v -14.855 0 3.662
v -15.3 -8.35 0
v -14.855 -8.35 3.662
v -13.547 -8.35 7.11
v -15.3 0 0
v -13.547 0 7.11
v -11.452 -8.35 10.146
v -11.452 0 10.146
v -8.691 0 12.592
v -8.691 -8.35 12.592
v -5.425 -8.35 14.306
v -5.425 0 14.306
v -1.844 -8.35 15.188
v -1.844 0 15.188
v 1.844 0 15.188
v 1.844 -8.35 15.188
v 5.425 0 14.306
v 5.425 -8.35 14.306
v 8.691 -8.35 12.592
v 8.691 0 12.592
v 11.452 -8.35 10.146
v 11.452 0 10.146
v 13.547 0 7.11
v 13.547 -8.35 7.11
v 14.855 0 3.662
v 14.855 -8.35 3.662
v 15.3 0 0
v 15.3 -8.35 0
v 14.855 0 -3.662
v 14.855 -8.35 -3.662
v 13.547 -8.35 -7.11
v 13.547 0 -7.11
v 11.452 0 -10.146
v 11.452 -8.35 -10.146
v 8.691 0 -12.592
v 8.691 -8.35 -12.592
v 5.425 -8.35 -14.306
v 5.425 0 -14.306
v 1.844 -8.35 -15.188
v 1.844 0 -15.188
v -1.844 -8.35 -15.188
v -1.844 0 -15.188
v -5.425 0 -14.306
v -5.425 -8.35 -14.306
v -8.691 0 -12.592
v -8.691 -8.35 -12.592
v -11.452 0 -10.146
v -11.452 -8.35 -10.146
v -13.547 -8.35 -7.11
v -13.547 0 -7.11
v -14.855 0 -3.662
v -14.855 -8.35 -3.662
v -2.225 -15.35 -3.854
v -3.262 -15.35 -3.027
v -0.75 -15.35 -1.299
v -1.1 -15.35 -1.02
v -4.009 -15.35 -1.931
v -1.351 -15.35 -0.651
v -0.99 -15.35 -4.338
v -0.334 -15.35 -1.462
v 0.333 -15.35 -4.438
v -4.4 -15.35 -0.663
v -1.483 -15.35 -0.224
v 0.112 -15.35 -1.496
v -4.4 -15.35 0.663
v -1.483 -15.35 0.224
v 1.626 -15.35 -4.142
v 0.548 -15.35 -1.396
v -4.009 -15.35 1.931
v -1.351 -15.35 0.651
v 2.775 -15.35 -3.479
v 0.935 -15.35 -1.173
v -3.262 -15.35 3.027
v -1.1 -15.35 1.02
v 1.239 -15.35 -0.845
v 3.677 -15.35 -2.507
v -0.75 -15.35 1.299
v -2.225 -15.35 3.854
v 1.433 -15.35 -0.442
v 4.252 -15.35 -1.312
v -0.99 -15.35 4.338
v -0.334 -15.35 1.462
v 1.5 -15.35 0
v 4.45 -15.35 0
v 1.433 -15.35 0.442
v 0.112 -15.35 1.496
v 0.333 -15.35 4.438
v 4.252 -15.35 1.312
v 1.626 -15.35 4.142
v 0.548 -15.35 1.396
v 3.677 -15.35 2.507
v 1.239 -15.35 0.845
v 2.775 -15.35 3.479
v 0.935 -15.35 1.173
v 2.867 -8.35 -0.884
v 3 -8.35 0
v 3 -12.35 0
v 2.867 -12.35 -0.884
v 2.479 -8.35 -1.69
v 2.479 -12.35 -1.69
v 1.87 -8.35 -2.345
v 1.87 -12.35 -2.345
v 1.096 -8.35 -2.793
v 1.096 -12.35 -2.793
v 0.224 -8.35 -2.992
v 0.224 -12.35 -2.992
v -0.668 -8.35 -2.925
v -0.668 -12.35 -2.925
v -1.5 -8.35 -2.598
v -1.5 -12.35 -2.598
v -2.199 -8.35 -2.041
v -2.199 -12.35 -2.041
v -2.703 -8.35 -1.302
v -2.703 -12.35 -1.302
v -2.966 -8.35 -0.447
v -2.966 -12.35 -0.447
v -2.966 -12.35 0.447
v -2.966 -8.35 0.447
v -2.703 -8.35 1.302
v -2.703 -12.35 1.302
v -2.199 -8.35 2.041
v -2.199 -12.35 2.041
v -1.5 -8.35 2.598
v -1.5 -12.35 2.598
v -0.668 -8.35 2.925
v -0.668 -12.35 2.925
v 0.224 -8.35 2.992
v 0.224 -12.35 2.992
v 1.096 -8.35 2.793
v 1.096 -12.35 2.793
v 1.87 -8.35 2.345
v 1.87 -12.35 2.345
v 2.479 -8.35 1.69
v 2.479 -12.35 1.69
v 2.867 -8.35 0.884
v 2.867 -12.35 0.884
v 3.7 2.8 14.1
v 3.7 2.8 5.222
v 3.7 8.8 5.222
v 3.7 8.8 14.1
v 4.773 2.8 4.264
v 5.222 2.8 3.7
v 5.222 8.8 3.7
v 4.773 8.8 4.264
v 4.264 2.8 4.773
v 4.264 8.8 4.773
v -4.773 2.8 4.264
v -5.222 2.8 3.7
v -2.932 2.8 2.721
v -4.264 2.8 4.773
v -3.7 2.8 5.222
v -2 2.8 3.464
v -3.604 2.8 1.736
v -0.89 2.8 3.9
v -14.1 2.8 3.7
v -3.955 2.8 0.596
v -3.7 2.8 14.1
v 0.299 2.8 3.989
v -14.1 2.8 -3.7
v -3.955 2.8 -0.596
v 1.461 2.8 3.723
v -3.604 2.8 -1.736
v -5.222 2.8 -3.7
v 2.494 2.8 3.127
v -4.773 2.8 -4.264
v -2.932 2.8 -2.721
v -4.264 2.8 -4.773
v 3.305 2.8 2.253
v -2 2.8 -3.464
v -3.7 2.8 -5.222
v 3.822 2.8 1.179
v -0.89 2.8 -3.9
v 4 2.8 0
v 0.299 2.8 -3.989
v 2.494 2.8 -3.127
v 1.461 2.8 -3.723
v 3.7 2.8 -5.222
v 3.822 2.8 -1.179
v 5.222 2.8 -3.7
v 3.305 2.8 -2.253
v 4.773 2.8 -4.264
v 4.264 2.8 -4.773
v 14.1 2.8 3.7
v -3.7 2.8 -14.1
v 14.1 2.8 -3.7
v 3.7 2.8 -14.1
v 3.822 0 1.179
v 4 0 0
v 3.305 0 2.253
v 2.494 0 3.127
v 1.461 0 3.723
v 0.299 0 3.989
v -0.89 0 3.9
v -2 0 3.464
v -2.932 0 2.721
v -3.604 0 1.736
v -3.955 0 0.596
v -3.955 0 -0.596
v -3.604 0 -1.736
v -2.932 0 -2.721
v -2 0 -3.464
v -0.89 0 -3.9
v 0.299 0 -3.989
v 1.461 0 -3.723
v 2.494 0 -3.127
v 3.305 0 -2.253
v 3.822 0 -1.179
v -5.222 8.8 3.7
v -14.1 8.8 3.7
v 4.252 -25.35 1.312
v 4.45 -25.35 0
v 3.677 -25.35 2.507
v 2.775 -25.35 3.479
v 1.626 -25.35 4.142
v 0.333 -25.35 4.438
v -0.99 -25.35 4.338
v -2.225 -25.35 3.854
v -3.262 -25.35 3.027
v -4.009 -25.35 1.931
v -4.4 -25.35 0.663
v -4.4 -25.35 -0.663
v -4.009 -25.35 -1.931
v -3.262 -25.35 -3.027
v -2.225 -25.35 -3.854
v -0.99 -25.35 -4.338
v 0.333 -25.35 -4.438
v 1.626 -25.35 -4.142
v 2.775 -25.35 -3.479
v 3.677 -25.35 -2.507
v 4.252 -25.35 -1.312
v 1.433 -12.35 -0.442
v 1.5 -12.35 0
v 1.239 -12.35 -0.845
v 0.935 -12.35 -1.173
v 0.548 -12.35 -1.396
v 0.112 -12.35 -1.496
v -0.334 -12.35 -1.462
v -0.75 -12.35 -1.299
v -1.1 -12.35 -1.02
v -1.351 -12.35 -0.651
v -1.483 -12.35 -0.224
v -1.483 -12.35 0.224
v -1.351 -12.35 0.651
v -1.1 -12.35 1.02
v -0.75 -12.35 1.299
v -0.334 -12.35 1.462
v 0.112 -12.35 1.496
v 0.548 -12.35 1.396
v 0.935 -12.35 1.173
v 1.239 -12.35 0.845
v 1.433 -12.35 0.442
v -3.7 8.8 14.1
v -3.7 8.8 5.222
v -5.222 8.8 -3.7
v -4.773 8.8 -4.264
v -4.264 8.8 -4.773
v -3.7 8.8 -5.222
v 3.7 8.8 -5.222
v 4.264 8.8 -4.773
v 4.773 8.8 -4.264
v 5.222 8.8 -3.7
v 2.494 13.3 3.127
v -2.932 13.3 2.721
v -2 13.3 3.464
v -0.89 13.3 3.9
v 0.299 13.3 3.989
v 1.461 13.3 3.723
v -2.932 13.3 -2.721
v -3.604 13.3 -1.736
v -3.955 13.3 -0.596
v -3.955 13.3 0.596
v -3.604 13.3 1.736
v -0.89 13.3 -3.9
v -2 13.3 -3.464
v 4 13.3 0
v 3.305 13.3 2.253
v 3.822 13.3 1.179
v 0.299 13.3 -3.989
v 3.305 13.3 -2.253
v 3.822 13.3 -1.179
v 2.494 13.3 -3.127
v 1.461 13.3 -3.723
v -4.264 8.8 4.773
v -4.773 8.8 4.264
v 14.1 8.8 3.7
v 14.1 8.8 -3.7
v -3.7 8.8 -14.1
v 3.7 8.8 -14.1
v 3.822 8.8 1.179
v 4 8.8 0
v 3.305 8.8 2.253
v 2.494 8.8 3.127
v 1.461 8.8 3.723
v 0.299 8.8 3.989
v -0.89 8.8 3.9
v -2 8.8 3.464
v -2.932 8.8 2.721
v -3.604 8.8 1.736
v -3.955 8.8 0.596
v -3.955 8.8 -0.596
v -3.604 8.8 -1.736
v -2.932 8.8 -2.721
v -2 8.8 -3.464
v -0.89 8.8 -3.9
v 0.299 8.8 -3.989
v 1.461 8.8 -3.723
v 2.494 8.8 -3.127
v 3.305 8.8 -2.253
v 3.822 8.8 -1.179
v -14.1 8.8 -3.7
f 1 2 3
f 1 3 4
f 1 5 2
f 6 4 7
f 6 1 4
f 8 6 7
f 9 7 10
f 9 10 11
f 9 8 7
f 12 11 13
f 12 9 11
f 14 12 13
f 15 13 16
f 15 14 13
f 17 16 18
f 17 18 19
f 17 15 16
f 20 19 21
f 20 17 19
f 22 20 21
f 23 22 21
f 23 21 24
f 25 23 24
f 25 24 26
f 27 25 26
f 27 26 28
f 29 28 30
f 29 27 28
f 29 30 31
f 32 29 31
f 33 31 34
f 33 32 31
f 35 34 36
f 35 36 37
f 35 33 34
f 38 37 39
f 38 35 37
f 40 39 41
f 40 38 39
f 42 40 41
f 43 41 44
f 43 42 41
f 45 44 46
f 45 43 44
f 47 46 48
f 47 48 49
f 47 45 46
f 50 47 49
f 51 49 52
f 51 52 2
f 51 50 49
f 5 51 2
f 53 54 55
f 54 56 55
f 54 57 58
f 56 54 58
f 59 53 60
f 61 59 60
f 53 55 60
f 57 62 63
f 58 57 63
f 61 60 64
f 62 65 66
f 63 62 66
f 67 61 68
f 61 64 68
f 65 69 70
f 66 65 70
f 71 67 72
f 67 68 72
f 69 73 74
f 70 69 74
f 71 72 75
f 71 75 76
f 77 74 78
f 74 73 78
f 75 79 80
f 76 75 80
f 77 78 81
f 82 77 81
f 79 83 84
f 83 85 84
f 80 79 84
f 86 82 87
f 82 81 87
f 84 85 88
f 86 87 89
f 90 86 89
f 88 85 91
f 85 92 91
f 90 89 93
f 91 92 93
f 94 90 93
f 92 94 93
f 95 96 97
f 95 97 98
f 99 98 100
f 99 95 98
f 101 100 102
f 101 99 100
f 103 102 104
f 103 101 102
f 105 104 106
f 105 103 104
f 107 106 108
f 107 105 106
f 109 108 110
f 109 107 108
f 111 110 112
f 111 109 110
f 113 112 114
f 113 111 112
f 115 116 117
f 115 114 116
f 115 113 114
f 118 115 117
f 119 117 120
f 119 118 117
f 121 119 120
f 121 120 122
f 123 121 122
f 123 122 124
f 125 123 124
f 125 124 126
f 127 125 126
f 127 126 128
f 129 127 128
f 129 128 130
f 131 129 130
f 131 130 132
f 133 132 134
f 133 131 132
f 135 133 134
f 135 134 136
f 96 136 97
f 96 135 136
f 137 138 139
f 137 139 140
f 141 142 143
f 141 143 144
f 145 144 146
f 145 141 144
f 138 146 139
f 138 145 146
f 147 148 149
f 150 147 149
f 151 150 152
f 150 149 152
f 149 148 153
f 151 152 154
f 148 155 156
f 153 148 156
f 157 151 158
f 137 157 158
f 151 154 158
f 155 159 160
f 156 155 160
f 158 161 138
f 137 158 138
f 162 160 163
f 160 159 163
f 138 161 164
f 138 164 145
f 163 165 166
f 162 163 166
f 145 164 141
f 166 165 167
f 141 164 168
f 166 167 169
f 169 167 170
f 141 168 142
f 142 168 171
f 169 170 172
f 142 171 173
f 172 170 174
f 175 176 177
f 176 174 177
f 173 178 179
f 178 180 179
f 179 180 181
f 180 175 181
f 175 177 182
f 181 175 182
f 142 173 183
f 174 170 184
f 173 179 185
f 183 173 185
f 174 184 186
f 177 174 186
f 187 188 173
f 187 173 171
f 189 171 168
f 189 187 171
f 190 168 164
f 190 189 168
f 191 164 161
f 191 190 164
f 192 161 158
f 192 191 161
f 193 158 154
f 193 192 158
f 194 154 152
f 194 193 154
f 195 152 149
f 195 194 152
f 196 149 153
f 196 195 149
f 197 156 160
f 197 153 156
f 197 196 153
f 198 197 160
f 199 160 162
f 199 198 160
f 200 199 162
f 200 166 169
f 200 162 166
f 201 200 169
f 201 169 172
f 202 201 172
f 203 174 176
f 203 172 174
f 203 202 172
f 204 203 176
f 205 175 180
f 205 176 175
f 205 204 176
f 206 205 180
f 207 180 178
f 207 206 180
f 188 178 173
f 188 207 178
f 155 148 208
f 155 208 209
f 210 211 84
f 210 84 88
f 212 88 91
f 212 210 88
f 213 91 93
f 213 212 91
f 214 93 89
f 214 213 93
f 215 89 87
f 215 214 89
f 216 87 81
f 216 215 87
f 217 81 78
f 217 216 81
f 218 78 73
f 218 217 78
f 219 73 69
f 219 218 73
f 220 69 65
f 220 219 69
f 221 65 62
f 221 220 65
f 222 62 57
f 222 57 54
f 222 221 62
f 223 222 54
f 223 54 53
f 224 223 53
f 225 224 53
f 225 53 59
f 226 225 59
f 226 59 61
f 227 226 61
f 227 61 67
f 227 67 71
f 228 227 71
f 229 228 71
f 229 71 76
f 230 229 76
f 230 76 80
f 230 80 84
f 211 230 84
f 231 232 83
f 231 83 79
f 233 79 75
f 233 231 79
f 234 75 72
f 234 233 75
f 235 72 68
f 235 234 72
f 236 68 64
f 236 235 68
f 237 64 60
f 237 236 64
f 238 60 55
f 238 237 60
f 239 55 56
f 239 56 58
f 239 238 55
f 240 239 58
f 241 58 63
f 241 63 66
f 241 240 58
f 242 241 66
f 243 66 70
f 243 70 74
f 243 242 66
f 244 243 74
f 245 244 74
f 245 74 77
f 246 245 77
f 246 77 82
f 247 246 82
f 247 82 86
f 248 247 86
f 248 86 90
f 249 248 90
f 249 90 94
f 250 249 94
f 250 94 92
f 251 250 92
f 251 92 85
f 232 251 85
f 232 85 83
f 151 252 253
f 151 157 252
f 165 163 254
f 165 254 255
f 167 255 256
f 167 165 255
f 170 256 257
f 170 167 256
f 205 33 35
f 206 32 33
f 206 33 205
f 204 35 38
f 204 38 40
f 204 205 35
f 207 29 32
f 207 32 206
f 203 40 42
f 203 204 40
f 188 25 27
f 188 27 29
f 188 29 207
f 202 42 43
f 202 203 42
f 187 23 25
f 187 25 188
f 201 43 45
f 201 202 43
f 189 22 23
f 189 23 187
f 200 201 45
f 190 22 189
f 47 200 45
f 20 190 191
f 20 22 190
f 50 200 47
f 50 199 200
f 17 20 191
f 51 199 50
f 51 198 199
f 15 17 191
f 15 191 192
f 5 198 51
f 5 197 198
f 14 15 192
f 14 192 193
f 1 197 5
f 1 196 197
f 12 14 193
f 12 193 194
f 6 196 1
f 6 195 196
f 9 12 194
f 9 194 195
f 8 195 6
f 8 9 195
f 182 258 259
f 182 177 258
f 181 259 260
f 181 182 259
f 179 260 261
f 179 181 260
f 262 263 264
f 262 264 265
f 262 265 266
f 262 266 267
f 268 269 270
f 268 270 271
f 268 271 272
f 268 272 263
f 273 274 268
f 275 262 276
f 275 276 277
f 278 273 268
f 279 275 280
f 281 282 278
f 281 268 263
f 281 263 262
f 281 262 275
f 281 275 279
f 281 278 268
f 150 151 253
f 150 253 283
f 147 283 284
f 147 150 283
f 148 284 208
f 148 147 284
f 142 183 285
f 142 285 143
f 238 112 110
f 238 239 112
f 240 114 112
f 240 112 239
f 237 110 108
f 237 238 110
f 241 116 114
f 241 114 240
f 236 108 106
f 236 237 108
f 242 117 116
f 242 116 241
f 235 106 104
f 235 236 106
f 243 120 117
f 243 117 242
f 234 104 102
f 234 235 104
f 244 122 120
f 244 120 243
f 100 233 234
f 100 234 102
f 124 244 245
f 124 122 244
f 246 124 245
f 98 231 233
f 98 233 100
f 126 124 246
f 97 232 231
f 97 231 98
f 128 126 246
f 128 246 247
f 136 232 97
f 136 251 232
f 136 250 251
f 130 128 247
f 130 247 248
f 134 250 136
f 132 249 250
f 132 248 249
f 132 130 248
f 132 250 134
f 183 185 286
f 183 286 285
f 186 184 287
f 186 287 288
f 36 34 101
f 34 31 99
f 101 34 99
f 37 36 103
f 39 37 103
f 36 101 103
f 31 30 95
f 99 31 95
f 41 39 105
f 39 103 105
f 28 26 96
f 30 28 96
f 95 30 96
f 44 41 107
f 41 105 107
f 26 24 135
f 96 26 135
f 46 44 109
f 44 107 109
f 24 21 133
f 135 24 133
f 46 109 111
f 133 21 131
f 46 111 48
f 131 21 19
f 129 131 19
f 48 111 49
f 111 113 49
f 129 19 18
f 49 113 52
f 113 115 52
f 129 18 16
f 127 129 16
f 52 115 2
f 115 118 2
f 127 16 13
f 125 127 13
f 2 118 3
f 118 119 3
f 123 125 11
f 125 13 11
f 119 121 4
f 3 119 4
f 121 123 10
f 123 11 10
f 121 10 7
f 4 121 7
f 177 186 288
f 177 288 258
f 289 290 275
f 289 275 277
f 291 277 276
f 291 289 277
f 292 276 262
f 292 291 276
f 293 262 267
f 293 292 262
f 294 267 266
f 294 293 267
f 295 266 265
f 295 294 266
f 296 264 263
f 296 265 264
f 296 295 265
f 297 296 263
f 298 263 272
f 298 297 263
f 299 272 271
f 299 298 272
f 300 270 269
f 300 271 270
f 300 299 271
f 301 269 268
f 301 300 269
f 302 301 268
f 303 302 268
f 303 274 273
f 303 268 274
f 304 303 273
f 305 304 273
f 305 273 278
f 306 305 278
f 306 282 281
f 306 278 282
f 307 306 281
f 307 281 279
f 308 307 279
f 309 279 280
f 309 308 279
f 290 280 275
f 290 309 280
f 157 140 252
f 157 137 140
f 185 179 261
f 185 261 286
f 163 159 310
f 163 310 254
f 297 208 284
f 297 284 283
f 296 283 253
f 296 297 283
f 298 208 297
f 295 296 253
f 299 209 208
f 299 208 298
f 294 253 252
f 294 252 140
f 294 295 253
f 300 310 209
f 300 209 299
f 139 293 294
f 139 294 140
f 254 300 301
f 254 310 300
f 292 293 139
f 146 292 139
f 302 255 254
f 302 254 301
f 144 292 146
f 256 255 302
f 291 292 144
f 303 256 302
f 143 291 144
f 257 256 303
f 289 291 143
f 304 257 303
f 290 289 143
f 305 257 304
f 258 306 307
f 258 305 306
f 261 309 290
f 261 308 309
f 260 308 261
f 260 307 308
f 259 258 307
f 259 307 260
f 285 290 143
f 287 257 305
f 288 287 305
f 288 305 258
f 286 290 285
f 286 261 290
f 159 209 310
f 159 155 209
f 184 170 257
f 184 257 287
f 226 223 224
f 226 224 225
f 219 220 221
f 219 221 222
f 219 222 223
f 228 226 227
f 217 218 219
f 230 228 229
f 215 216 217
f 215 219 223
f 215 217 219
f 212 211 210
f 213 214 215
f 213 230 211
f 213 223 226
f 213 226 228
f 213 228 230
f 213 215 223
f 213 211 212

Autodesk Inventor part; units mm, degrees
ref_plane "YZ Plane" through (0, 0, 0) normal (1, 0, 0) x (0, 1, 0)
ref_plane "XZ Plane" through (0, 0, 0) normal (0, 1, 0) x (-1, 0, 0)
ref_plane "XY Plane" through (0, 0, 0) normal (0, 0, 1) x (1, 0, 0)
sketch "Sketch1" plane through (0, 0, 0) normal (0, 1, 0) x (-1, 0, 0)
  circle A0 centre (0, 0) radius 15.3
  dimension "d0" = 30.6
extrude "Extrusion1" add sketch "Sketch1" against normal blind 8.35
sketch "Sketch2" plane through (0, 0, 0) normal (0, 1, 0) x (1, 0, 0)
  circle A0 centre (0, 0) radius 4
  dimension "d3" = 8
extrude "Extrusion2" add sketch "Sketch2" along normal blind 2.8
sketch "Sketch3" plane through (0, 2.8, 0) normal (0, 1, 0) x (1, 0, 0)
  line L0 (-3.7, 14.1) -> (3.7, 14.1)
  line L1 (3.7, -14.1) -> (-3.7, -14.1)
  line L2 (-3.7, 14.1) -> (3.7, -14.1) construction
  line L3 (3.7, 14.1) -> (-3.7, -14.1) construction
  line L4 (14.1, 3.7) -> (14.1, -3.7)
  line L5 (-14.1, -3.7) -> (-14.1, 3.7)
  line L6 (-14.1, 3.7) -> (14.1, -3.7) construction
  line L7 (14.1, 3.7) -> (-14.1, -3.7) construction
  line L8 (3.7, 14.1) -> (3.7, 5.2221)
  line L9 (3.7, -5.2221) -> (3.7, -14.1)
  line L10 (14.1, -3.7) -> (5.2221, -3.7)
  line L11 (-5.2221, -3.7) -> (-14.1, -3.7)
  line L12 (-14.1, 3.7) -> (-5.2221, 3.7)
  line L13 (5.2221, 3.7) -> (14.1, 3.7)
  line L14 (-3.7, -14.1) -> (-3.7, -5.2221)
  line L15 (-3.7, 5.2221) -> (-3.7, 14.1)
  arc A0 (3.7, -5.2221) -> (5.2221, -3.7) centre (0, 0) ccw
  arc A1 (-5.2221, -3.7) -> (-3.7, -5.2221) centre (0, 0) ccw
  arc A2 (5.2221, 3.7) -> (3.7, 5.2221) centre (0, 0) ccw
  arc A3 (-3.7, 5.2221) -> (-5.2221, 3.7) centre (0, 0) ccw
  dimension "d6" = 7.4
  dimension "d7" = 28.2
  dimension "d8" = 28.2
  dimension "d9" = 7.4
extrude "Extrusion3" add sketch "Sketch3" along normal blind 6
sketch "Sketch4" plane through (0, 8.8, 0) normal (0, 1, 0) x (1, 0, 0)
  circle A0 centre (0, 0) radius 4
  dimension "d13" = 8
extrude "Extrusion4" add sketch "Sketch4" along normal blind 4.5
sketch "Sketch5" plane through (0, -8.35, 0) normal (0, -1, 0) x (1, 0, 0)
  circle A0 centre (0, 0) radius 4 projected
  circle A1 centre (0, 0) radius 3
  dimension "d16" = 6
extrude "Extrusion5" add sketch "Sketch5" along normal blind 4 contours A1
sketch "Sketch6" plane through (0, -12.35, 0) normal (0, -1, 0) x (1, 0, 0)
  circle A0 centre (0, 0) radius 1.5
  dimension "d19" = 3
extrude "Extrusion6" add sketch "Sketch6" along normal blind 13
sketch "Sketch7" plane through (0, -25.35, 0) normal (0, -1, 0) x (1, 0, 0)
  circle A0 centre (0, 0) radius 4.45
  dimension "d22" = 8.9
extrude "Extrusion7" add sketch "Sketch7" against normal blind 10
properties part number "BrImp_Motormodel" material "Aluminum 6061"
